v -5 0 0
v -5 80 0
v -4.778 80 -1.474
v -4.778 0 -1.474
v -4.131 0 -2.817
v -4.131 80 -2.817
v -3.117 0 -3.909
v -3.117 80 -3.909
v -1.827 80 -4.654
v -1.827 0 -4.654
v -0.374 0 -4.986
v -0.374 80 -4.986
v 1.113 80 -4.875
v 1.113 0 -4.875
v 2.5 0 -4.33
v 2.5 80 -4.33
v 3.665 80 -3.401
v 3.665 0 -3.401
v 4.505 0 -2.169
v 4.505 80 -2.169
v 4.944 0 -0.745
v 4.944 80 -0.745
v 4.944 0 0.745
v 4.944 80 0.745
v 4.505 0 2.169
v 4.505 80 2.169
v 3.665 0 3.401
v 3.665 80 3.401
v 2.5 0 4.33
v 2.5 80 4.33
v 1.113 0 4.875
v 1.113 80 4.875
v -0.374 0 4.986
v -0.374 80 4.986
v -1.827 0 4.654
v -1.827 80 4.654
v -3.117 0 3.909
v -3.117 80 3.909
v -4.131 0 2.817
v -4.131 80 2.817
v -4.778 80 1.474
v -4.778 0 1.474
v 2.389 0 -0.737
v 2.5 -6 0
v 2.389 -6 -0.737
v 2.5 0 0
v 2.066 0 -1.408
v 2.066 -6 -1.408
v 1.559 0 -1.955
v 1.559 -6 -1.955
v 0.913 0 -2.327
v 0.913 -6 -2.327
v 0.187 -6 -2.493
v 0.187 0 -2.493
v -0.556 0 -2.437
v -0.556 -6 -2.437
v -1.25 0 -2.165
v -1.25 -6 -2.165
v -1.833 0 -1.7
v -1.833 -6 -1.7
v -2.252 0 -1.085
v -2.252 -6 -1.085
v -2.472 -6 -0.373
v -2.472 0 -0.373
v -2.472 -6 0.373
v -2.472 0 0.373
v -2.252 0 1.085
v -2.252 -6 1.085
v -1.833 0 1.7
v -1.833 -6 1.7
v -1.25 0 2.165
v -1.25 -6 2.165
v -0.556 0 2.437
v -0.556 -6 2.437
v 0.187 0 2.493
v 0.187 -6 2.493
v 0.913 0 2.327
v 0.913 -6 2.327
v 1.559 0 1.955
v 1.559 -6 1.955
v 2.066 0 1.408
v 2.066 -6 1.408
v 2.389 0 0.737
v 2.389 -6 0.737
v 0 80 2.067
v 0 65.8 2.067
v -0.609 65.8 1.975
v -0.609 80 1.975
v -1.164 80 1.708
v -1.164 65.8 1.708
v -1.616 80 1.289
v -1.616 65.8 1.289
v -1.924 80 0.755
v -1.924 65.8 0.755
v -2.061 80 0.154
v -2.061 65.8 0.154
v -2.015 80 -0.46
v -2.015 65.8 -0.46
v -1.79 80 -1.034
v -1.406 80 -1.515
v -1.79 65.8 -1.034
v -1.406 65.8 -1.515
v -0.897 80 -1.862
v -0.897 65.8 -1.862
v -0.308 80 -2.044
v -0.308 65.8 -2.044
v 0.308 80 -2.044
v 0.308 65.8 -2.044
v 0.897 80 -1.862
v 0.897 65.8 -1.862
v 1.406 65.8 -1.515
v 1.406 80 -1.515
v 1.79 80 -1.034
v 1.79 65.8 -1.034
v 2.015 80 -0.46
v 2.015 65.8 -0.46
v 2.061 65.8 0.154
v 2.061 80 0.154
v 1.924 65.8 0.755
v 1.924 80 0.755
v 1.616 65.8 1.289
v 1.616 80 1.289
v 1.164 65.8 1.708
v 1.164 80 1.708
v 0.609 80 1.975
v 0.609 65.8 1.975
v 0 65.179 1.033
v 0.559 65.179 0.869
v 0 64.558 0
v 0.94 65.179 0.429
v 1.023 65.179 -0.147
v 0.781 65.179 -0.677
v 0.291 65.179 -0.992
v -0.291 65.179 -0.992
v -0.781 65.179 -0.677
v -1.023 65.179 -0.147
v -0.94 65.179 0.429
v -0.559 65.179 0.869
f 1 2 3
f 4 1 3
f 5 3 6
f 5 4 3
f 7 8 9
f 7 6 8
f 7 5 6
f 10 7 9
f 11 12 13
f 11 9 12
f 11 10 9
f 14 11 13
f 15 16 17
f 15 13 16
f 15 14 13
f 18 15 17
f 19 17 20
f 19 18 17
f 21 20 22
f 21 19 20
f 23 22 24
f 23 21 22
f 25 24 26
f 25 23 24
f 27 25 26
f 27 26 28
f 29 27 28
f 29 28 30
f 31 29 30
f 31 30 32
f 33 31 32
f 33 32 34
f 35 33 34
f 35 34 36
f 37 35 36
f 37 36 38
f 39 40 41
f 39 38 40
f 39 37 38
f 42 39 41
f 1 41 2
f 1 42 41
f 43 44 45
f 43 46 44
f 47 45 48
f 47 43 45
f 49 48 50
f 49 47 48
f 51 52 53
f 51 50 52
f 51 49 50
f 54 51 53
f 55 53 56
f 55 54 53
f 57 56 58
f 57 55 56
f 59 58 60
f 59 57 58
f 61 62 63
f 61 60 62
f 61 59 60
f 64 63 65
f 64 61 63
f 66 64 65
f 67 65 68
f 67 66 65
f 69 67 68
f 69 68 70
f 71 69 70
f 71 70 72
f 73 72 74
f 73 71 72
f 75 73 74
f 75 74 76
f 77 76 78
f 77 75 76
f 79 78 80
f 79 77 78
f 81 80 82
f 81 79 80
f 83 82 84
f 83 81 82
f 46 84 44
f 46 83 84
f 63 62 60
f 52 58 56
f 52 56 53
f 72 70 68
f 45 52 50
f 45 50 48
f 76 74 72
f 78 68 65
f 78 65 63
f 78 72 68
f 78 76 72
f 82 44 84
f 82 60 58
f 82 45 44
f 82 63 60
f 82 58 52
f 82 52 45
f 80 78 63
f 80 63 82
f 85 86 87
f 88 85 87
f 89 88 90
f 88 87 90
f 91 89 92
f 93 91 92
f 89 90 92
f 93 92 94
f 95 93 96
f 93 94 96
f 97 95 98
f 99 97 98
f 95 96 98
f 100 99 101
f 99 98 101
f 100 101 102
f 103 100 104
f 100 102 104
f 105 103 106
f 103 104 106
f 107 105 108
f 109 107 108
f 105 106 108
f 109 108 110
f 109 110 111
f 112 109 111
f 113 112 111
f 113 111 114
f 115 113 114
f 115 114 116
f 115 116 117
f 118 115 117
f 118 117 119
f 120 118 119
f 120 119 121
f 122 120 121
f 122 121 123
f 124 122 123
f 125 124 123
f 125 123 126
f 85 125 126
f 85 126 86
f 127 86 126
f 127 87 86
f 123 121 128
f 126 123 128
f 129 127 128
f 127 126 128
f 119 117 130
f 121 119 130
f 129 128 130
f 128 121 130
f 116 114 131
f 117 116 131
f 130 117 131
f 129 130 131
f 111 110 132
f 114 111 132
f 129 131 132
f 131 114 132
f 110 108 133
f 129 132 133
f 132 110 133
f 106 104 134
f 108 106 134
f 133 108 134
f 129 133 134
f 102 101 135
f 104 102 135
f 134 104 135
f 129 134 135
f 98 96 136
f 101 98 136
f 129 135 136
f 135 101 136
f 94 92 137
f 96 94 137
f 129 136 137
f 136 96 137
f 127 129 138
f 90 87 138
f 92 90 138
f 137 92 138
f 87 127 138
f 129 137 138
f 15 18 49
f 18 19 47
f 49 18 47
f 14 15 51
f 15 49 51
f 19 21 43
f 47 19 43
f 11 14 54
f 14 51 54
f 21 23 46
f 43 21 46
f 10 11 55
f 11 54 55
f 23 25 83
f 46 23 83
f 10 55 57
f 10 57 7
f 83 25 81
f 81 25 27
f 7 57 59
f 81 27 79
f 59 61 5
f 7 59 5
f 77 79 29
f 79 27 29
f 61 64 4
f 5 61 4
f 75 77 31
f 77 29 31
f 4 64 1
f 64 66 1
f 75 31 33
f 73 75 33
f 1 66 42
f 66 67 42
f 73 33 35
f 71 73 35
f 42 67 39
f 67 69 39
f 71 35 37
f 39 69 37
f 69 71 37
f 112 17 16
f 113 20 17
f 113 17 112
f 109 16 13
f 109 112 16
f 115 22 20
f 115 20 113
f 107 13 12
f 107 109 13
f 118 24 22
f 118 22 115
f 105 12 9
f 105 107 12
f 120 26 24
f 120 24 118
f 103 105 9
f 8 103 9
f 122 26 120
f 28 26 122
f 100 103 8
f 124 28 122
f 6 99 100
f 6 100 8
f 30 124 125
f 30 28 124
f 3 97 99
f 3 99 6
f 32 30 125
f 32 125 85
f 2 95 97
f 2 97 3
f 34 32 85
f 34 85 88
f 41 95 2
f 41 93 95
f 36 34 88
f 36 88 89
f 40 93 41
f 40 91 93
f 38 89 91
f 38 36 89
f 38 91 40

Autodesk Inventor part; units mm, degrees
ref_plane "YZ Plane" through (0, 0, 0) normal (1, 0, 0) x (0, 1, 0)
ref_plane "XZ Plane" through (0, 0, 0) normal (0, 1, 0) x (-1, 0, 0)
ref_plane "XY Plane" through (0, 0, 0) normal (0, 0, 1) x (1, 0, 0)
sketch "Esboço1" plane through (0, 0, 0) normal (0, 1, 0) x (-1, 0, 0)
  circle A0 centre (0, 0) radius 5
  dimension "d0" = 10
extrude "Extrusão1" add sketch "Esboço1" along normal blind 80
sketch "Esboço3" plane through (0, 0, 0) normal (0, -1, 0) x (1, 0, 0)
  circle A0 centre (0, 0) radius 2.5
  dimension "d9" = 5
extrude "Extrusão3" add sketch "Esboço3" along normal blind 6
thread "Rosca2" size "M5x0.8" class "6g" standard "ANSI Metric M Profile" length 15
sketch "Sketch4" plane through (0, 80, 0) normal (0, 1, 0) x (1, 0, 0)
  circle A0 centre (0, 0) radius 5 projected
hole "Hole1" at (0, 80, 0) direction (0, -1, 0) diameter 4.134 depth 14.2 tip angle 118 thread size "M5x0.8" class "6H" standard "ISO Metric profile"
equation "\"Raio_vergadura\" = Espessura"
equation "\"Largura_alívio_de_vergadura\" = Espessura"
equation "\"Profundidade_alívio_de_vergadura\" = 0.5 * Espessura"
equation "\"Tamanho_alívio_de_dobra\" = 4 * Espessura"
equation "\"Remanescente_mínimo\" = 2 * Espessura"
equation "\"Raiodetransição\" = Raio_vergadura"
equation "\"Tamanho_de_raio_de_Jacobi\" = Raio_vergadura"
equation "\"TamanhoFolga\" = Espessura"
equation "\"Espessura\" = 0.5"
properties part number "Suporte da mesa" material "Brass, Soft Yellow"
